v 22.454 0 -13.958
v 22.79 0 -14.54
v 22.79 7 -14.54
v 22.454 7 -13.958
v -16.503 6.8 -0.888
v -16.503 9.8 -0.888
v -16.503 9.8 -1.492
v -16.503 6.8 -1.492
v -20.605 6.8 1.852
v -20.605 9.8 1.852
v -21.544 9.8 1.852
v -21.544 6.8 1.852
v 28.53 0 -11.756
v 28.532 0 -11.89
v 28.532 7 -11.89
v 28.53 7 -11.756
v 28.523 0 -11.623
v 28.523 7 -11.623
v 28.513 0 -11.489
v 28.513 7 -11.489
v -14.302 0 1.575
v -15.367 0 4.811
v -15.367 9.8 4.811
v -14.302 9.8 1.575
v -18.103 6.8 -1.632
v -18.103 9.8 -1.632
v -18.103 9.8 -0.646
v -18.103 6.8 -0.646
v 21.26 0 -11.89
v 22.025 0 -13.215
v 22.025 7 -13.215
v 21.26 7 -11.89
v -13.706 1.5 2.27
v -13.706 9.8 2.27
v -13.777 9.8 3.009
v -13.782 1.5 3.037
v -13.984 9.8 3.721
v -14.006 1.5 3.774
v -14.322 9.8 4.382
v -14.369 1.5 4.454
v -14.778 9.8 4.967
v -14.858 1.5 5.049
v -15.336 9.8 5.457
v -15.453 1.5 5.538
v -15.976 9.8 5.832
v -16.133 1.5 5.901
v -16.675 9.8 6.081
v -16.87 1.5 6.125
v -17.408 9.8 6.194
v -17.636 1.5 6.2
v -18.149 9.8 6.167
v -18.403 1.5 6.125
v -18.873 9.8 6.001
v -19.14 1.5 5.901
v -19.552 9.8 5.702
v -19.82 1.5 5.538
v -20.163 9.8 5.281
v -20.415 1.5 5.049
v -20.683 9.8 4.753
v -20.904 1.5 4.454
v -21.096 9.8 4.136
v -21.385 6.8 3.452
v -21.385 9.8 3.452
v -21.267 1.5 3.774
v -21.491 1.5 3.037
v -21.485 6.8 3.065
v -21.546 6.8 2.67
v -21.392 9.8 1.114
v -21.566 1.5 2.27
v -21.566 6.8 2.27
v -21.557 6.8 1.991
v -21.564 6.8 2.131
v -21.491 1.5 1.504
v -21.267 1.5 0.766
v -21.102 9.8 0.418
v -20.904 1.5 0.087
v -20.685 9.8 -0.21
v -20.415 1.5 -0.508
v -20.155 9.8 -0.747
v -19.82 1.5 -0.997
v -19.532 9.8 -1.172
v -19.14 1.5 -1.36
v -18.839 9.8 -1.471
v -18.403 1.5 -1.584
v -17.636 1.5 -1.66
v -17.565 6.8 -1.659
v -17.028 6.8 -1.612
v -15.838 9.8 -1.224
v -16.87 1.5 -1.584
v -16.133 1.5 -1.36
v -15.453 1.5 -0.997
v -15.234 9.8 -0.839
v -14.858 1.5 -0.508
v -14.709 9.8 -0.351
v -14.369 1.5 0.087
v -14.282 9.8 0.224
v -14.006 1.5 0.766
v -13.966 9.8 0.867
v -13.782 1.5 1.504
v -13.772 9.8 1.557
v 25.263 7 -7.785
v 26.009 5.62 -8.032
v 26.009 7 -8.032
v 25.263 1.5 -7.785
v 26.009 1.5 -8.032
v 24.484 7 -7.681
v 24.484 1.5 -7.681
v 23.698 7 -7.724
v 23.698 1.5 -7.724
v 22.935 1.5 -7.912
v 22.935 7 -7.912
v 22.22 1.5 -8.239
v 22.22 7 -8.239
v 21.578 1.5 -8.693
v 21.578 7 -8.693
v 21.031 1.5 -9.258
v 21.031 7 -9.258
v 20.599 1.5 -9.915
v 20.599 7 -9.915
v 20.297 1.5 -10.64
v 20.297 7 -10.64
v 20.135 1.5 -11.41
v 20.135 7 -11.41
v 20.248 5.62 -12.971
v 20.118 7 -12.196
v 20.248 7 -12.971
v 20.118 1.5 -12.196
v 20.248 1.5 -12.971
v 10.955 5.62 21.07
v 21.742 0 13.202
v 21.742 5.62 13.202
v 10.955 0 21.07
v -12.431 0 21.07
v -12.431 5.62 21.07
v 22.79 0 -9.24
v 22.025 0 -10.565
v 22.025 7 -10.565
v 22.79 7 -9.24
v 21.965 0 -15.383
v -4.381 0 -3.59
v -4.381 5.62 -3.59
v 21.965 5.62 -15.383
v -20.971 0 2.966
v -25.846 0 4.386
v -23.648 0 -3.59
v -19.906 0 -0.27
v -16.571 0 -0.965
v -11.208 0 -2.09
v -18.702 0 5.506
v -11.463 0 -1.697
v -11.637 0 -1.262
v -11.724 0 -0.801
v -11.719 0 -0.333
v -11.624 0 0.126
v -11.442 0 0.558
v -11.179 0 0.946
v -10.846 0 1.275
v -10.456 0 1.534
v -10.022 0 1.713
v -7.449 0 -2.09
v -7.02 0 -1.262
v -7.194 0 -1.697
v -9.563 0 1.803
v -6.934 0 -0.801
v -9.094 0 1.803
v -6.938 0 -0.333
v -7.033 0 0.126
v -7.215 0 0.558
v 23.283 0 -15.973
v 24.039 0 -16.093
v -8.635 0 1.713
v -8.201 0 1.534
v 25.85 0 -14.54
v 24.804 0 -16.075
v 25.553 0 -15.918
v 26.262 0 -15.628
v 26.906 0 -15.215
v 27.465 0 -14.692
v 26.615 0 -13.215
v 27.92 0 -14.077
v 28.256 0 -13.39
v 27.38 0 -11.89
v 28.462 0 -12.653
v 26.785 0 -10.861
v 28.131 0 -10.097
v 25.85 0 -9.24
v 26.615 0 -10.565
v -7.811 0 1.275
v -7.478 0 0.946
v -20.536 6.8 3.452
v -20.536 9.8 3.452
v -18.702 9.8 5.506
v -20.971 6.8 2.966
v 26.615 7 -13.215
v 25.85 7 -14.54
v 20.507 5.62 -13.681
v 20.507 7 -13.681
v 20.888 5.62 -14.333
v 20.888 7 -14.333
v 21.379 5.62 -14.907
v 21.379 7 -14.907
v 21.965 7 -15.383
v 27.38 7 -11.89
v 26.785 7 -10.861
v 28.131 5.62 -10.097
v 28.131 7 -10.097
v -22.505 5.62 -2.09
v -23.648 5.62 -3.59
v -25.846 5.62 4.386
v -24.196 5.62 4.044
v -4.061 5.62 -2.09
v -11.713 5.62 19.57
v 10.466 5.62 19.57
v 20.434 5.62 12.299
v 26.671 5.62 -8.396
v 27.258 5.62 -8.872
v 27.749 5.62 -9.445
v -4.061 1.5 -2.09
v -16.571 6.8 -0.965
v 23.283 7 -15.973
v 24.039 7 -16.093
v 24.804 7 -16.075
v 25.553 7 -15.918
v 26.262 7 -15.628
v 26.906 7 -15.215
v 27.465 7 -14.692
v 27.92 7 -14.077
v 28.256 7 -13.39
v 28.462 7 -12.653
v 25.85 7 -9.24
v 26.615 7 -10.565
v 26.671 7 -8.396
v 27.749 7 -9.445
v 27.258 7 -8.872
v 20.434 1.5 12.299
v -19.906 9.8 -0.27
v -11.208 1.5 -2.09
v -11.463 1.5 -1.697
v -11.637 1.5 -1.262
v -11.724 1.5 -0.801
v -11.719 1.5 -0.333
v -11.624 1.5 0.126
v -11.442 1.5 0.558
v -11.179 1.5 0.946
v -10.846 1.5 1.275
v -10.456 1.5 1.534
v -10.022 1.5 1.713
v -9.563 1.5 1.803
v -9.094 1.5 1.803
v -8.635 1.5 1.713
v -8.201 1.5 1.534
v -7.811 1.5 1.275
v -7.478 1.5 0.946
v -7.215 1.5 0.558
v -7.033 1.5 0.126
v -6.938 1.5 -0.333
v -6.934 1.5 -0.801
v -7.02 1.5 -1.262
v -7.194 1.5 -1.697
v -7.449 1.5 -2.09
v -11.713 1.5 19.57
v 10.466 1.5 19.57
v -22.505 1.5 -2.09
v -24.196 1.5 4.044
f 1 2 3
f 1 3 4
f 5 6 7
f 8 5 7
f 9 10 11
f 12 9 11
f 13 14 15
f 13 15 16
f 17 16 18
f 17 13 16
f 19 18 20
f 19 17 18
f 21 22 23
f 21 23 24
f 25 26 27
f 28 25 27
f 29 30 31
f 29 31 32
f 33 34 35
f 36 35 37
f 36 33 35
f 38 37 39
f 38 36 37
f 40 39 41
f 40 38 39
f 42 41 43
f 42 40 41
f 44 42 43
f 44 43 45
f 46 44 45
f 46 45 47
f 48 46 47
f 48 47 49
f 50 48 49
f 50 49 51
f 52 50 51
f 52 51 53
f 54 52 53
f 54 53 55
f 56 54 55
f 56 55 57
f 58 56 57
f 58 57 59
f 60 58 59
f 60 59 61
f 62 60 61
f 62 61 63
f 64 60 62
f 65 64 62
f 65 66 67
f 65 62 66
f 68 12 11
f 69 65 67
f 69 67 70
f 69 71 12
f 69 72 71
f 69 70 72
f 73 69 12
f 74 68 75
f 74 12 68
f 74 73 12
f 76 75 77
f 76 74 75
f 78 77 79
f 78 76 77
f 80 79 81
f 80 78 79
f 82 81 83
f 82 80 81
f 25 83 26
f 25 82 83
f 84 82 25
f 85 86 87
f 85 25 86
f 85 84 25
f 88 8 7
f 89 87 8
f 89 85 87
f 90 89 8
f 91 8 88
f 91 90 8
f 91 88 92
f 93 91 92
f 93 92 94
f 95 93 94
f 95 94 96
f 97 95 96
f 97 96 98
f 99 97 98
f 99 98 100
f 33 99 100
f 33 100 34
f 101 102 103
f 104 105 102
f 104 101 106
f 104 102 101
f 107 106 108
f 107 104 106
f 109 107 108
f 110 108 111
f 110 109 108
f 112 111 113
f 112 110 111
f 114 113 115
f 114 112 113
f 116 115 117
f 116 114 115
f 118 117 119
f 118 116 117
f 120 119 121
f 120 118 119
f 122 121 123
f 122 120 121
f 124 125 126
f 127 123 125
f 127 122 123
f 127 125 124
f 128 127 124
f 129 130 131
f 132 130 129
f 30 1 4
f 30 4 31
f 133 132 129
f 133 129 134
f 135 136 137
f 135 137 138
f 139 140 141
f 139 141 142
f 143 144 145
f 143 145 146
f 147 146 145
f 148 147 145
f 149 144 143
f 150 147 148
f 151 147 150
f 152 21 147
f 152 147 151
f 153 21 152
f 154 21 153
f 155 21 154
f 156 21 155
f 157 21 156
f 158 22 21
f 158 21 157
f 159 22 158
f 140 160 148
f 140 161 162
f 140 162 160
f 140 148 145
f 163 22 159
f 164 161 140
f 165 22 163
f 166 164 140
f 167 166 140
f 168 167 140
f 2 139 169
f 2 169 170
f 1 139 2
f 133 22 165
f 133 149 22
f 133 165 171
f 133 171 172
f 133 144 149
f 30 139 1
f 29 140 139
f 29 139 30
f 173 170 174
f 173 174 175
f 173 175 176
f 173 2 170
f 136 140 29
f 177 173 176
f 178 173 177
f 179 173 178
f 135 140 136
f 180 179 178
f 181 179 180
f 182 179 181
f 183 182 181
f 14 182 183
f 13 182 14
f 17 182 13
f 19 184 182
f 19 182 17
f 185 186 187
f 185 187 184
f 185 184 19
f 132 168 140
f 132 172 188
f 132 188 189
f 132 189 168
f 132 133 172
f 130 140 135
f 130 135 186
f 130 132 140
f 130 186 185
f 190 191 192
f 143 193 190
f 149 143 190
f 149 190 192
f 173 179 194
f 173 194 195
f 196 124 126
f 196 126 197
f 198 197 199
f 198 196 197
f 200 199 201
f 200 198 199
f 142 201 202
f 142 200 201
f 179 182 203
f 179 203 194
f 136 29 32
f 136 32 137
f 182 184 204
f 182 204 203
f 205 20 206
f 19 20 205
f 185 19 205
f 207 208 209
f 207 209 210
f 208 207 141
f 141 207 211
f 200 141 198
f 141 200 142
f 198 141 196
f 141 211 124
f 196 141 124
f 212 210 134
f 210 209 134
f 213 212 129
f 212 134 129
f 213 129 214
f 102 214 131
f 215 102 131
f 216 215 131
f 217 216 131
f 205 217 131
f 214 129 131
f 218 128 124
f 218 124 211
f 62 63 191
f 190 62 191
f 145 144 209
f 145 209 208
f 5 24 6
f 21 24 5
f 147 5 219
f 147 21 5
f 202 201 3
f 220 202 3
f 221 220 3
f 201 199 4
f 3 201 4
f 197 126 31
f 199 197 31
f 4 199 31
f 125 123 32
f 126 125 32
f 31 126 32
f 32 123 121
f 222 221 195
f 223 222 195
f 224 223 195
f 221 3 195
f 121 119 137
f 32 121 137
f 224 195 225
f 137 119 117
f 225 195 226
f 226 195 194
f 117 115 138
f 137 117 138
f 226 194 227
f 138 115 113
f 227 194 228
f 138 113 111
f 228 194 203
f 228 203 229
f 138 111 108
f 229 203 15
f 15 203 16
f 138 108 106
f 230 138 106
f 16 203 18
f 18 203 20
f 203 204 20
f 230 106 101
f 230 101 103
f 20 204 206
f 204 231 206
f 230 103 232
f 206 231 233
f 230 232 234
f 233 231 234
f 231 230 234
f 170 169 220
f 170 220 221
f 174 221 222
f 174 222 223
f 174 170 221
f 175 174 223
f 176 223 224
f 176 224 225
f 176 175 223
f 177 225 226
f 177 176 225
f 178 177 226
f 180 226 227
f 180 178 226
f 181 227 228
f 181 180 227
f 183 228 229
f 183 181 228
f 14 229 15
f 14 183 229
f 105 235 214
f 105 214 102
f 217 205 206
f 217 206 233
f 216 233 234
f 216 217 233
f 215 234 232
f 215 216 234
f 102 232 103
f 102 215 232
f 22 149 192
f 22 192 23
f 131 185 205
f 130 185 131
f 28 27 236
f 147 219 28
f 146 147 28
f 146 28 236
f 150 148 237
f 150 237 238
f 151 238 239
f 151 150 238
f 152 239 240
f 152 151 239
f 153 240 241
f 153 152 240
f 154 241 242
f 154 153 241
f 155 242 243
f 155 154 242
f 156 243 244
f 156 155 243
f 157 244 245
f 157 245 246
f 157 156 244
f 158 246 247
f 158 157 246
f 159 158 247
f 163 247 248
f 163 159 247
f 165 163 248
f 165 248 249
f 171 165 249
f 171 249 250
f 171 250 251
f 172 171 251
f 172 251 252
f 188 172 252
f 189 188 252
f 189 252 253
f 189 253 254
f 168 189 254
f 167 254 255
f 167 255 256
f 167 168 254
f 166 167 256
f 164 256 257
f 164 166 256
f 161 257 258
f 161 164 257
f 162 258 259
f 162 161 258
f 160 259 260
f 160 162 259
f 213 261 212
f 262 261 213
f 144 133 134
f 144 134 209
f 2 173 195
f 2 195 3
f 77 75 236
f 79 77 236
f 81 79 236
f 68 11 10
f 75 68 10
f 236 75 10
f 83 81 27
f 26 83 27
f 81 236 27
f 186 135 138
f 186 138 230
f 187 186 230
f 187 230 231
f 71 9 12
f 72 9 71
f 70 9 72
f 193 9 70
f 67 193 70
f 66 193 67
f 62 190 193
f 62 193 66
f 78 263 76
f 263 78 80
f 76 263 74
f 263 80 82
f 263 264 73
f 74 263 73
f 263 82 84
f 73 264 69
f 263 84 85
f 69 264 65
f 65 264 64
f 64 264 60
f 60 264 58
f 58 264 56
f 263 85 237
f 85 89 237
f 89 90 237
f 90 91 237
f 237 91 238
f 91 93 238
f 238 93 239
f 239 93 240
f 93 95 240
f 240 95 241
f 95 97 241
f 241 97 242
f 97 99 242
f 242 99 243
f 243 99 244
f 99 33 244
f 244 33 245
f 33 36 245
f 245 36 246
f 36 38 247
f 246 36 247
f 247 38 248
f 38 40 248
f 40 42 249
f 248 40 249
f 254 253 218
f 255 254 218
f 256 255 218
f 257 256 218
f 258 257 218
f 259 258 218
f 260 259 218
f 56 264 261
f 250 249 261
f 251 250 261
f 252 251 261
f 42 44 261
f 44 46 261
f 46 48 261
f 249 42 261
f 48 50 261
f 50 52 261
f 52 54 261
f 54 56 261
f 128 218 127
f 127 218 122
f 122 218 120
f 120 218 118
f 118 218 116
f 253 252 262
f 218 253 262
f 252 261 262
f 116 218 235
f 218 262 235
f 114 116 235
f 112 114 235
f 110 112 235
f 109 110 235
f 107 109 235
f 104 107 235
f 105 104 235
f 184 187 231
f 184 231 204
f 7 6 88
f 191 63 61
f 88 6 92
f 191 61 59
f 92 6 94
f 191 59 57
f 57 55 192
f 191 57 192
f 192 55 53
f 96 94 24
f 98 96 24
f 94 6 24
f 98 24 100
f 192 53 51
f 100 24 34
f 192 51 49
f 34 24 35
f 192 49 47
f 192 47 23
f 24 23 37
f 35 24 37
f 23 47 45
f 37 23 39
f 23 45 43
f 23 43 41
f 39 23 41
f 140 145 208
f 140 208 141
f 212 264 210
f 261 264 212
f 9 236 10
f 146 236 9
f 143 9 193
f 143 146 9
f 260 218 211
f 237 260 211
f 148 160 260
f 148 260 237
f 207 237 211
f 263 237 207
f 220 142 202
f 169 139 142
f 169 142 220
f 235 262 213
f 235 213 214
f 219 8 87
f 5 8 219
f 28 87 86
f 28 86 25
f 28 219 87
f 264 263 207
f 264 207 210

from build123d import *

# Parameters (mm, degrees)
F0_R     = 3.93
F1_DEPTH = 1.5
F2_DEPTH = 5.62
F3_DEPTH = 9.8
F4_DEPTH = 7
F7_DEPTH = 3


with BuildPart() as f1:
    # F0 (on Front) → F1 (new body)
    with BuildSketch(Plane.XZ):
        with BuildLine():
            Line((-22.505389868, -2.0895681901), (-11.2077256692, -2.0895681901))
            ThreePointArc((-11.2077256692, -2.0895681901), (-9.3285928413, 1.8148319814), (-7.4494600134, -2.0895681901))
            Line((-7.4494600134, -2.0895681901), (-4.0605032691, -2.0895681901))
            Line((-4.0605032691, -2.0895681901), (20.2483866423, -12.9712812224))
            ThreePointArc((20.2483866423, -12.9712812224), (21.5778297936, -8.6925507754), (26.0093476524, -8.0317915166))
            Line((26.0093476524, -8.0317915166), (20.4338732281, 12.2993333716))
            Line((20.4338732281, 12.2993333716), (10.4662147941, 19.5698092025))
            Line((10.4662147941, 19.5698092025), (-11.712607269, 19.5698092025))
            Line((-11.712607269, 19.5698092025), (-24.1958881701, 4.0444751638))
            Line((-24.1958881701, 4.0444751638), (-22.505389868, -2.0895681901))
        make_face()
        with Locations((-17.636482101, 2.2704318099)):
            Circle(F0_R, mode=Mode.SUBTRACT)
    extrude(amount=-F1_DEPTH)

    # F0 (on Front) → F2 (join)
    with BuildSketch(Plane.XZ):
        with BuildLine():
            Line((-7.4494600134, -2.0895681901), (-9.3285928413, -2.0895681901))
            Line((-9.3285928413, -2.0895681901), (-11.2077256692, -2.0895681901))
            Line((-11.2077256692, -2.0895681901), (-22.505389868, -2.0895681901))
            Line((-22.505389868, -2.0895681901), (-24.1958881701, 4.0444751638))
            Line((-24.1958881701, 4.0444751638), (-11.712607269, 19.5698092025))
            Line((-11.712607269, 19.5698092025), (10.4662147941, 19.5698092025))
            Line((10.4662147941, 19.5698092025), (20.4338732281, 12.2993333716))
            Line((20.4338732281, 12.2993333716), (26.0093476524, -8.0317915166))
            ThreePointArc((26.0093476524, -8.0317915166), (27.2575403042, -8.8716753621), (28.1309747483, -10.096625174))
            Line((28.1309747483, -10.096625174), (21.7417066053, 13.2020214837))
            Line((21.7417066053, 13.2020214837), (10.9551470408, 21.0698092025))
            Line((10.9551470408, 21.0698092025), (-12.4312654999, 21.0698092025))
            Line((-12.4312654999, 21.0698092025), (-25.8459559813, 4.3860902027))
            Line((-25.8459559813, 4.3860902027), (-23.6479217985, -3.5895681901))
            Line((-23.6479217985, -3.5895681901), (-4.3809167168, -3.5895681901))
            Line((-4.3809167168, -3.5895681901), (21.9651791943, -15.3832229506))
            ThreePointArc((21.9651791943, -15.3832229506), (20.887904522, -14.3330472271), (20.2483866423, -12.9712812224))
            Line((20.2483866423, -12.9712812224), (-4.0605032691, -2.0895681901))
            Line((-4.0605032691, -2.0895681901), (-7.4494600134, -2.0895681901))
        make_face()
    extrude(amount=-F2_DEPTH)

    # F0 (on Front) → F3 (join)
    with BuildSketch(Plane.XZ):
        with Locations((-17.636482101, 2.2704318099)):
            Circle(F0_R)
        Polygon((-16.5711225386, -0.9650499681), (-19.9058117331, -0.2699375244), (-20.9711712955, 2.9655442536), (-18.7018416635, 5.5059135879), (-15.367152469, 4.8108011442), (-14.3017929065, 1.5753193661), align=None, mode=Mode.SUBTRACT)
    extrude(amount=-F3_DEPTH)

    # F0 (on Front) → F4 (join)
    with BuildSketch(Plane.XZ):
        with BuildLine():
            Line((22.4537352546, -13.9584908738), (20.2483866423, -12.9712812224))
            ThreePointArc((20.2483866423, -12.9712812224), (20.887904522, -14.3330472271), (21.9651791943, -15.3832229506))
            Line((21.9651791943, -15.3832229506), (23.2829635099, -15.9731203426))
            ThreePointArc((23.2829635099, -15.9731203426), (26.905846951, -15.2153095013), (28.5319774541, -11.8903641956))
            ThreePointArc((28.5319774541, -11.8903641956), (28.5271836329, -11.6894581734), (28.5128130807, -11.4890094325))
            Line((28.5128130807, -11.4890094325), (28.1309747483, -10.096625174))
            ThreePointArc((28.1309747483, -10.096625174), (27.2575403042, -8.8716753621), (26.0093476524, -8.0317915166))
            Line((26.0093476524, -8.0317915166), (26.7851210641, -10.8606711631))
            Line((26.7851210641, -10.8606711631), (27.3796146136, -11.8903641956))
            Line((27.3796146136, -11.8903641956), (26.6146255071, -13.2153641953))
            Line((26.6146255071, -13.2153641953), (25.8496364003, -14.5403641956))
            Line((25.8496364003, -14.5403641956), (24.3196581869, -14.5403641956))
            Line((24.3196581869, -14.5403641956), (22.7896799735, -14.5403641956))
            Line((22.7896799735, -14.5403641956), (22.4537352546, -13.9584908738))
        make_face()
        with BuildLine():
            ThreePointArc((26.0093476524, -8.0317915166), (21.5778297936, -8.6925507754), (20.2483866423, -12.9712812224))
            Line((20.2483866423, -12.9712812224), (22.4537352546, -13.9584908738))
            Line((22.4537352546, -13.9584908738), (22.024690908, -13.2153642668))
            Line((22.024690908, -13.2153642668), (21.2597017602, -11.8903641956))
            Line((21.2597017602, -11.8903641956), (22.0246909248, -10.5653640952))
            Line((22.0246909248, -10.5653640952), (22.7896799735, -9.2403641956))
            Line((22.7896799735, -9.2403641956), (24.3196581869, -9.2403641956))
            Line((24.3196581869, -9.2403641956), (25.8496364003, -9.2403641956))
            Line((25.8496364003, -9.2403641956), (26.6146254836, -10.5653641553))
            Line((26.6146254836, -10.5653641553), (26.7851210641, -10.8606711631))
            Line((26.7851210641, -10.8606711631), (26.0093476524, -8.0317915166))
        make_face()
    extrude(amount=-F4_DEPTH)

    # F6 (on face) → F7 (cut)
    with BuildSketch(Plane(origin=(0, 9.8, 0), x_dir=(-1, 0, 0), z_dir=(0, 1, 0))):
        with BuildLine():
            ThreePointArc((16.5027278304, -1.4924794638), (17.2955343411, -1.6447507689), (18.1027278304, -1.6318130466))
            Line((18.1027278304, -1.6318130466), (18.1027278304, -0.6457884612))
            Line((18.1027278304, -0.6457884612), (16.5711225386, -0.9650499681))
            Line((16.5711225386, -0.9650499681), (16.5027278304, -0.8884864682))
            Line((16.5027278304, -0.8884864682), (16.5027278304, -1.4924794638))
        make_face()
        with BuildLine():
            Line((20.9711712955, 2.9655442536), (20.60459144, 1.852246467))
            Line((20.60459144, 1.852246467), (21.544169527, 1.852246467))
            ThreePointArc((21.544169527, 1.852246467), (21.5608999932, 2.0610417242), (21.566482101, 2.2704318099))
            ThreePointArc((21.566482101, 2.2704318099), (21.520739578, 2.8682978924), (21.3845768325, 3.452246467))
            Line((21.3845768325, 3.452246467), (20.5363968161, 3.452246467))
            Line((20.5363968161, 3.452246467), (20.9711712955, 2.9655442536))
        make_face()
    extrude(amount=-F7_DEPTH, mode=Mode.SUBTRACT)


solid = f1.part
